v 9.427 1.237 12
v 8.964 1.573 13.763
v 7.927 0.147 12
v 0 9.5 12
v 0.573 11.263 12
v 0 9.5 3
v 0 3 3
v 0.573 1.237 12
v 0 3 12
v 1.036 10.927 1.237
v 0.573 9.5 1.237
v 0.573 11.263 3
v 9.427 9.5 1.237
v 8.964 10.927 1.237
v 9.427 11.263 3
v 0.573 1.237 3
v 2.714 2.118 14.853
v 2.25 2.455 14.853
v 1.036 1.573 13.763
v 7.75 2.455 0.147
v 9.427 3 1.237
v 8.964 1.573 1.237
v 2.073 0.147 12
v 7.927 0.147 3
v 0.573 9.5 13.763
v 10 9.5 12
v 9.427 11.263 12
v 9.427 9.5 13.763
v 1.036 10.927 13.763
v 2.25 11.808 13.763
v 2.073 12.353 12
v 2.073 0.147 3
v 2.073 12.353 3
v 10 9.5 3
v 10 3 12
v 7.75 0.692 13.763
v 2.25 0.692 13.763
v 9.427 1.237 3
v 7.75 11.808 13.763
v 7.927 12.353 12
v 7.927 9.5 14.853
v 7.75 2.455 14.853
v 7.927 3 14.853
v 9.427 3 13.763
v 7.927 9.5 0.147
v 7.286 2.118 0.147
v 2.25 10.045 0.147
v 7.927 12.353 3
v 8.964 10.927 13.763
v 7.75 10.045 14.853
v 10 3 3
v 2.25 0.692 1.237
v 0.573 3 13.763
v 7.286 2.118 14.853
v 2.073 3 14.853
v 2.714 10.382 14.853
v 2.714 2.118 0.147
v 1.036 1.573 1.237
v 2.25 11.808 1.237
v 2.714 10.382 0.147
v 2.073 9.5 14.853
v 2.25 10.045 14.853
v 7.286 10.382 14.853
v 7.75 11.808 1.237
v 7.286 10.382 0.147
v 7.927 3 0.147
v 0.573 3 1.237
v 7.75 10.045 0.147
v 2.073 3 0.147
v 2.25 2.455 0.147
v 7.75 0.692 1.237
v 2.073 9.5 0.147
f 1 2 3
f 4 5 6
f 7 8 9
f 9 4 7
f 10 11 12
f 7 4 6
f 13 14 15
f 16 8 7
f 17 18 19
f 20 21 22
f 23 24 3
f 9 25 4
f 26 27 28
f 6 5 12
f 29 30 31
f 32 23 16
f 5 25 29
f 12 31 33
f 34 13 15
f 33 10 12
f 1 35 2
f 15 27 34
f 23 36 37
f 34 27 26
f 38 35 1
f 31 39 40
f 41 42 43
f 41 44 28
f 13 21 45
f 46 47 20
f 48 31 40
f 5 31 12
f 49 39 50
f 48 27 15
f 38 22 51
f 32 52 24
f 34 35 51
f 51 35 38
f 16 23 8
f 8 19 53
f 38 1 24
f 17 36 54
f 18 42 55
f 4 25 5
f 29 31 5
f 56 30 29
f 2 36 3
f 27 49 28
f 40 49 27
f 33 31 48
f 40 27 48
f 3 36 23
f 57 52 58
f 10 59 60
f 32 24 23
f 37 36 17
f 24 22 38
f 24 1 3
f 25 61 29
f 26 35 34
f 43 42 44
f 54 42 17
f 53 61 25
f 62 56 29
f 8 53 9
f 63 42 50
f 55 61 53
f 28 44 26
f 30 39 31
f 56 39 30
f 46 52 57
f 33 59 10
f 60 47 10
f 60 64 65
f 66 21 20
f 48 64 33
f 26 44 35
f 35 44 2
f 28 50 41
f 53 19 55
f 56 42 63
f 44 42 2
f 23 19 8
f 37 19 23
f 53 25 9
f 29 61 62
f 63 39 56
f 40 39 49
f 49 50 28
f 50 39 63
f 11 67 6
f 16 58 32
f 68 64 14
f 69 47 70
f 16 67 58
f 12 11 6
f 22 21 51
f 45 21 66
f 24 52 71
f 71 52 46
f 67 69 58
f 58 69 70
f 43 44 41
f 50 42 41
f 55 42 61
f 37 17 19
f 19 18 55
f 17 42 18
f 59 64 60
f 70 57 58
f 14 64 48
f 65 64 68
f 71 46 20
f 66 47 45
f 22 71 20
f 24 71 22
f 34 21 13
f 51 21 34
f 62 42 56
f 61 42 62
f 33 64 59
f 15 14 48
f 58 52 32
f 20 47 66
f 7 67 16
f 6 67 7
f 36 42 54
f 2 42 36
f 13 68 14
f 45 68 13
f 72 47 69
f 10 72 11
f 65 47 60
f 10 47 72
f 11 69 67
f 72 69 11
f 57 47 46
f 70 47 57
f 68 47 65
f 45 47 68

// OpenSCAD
/**
 * A cube with radiusounded coradiusneradiuss
 *
 * https://hackaday.com/2018/02/13/openscad-tieing-it-togetheradius-with-hull/
 */
module roundcube(
        size_x,
        size_y,
        size_z,
        radius
        )
{
	hull()
	{
        for (x = [radius, size_x-radius])
            for (y = [radius, size_y-radius])
                for (z = [radius, size_z-radius])
                    translate([x, y, z])
                    sphere(radius);
	}
}

// Demo cube
roundcube(
    10,
    12.5,
    15,
    3
);
